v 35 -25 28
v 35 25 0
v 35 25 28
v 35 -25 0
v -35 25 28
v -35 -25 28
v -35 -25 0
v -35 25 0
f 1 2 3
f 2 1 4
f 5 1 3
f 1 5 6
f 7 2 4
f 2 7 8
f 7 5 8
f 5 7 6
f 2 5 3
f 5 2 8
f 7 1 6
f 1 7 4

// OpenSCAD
// Two-part enclosure for small electronics board
// Print orientation: box standing on bed, lid plate flat on bed (upside down)

// ---------- Parameters ----------
box_x      = 70;    // box outer length (X)
box_y      = 50;    // box outer width (Y)
box_z      = 30;    // box outer height (Z)
box_wall   = 2;     // box wall thickness
box_floor  = 2;     // box floor thickness

lip_t      = 1.5;   // lip wall thickness
lip_h      = 4;     // lip height above plate
lip_x      = 65.6;  // lip outer length (X)
lip_y      = 45.6;  // lip outer width (Y)
lip_over   = 0.2;   // lip clearance per side (outer - inner)/2

eps        = 0.5;   // cutter overshoot
$fn        = 64;

// ---------- Derived ----------
box_inner_x = box_x - 2*box_wall;
box_inner_y = box_y - 2*box_wall;
plate_t     = 2;    // lid plate thickness

// ---------- Model ----------
union() {
    // Box body (open top)
    difference() {
        translate([-box_x/2, -box_y/2, 0])
            cube([box_x, box_y, box_z - box_floor]);
        translate([-box_inner_x/2, -box_inner_y/2, -eps])
            cube([box_inner_x, box_inner_y, box_floor + eps]);
    }

    // Lid: plate + centred lip
    union() {
        translate([-box_x/2, -box_y/2, 0])
            cube([box_x, box_y, plate_t]);
        translate([-lip_x/2, -lip_y/2, plate_t])
            cube([lip_x, lip_y, lip_h]);
    }
}
